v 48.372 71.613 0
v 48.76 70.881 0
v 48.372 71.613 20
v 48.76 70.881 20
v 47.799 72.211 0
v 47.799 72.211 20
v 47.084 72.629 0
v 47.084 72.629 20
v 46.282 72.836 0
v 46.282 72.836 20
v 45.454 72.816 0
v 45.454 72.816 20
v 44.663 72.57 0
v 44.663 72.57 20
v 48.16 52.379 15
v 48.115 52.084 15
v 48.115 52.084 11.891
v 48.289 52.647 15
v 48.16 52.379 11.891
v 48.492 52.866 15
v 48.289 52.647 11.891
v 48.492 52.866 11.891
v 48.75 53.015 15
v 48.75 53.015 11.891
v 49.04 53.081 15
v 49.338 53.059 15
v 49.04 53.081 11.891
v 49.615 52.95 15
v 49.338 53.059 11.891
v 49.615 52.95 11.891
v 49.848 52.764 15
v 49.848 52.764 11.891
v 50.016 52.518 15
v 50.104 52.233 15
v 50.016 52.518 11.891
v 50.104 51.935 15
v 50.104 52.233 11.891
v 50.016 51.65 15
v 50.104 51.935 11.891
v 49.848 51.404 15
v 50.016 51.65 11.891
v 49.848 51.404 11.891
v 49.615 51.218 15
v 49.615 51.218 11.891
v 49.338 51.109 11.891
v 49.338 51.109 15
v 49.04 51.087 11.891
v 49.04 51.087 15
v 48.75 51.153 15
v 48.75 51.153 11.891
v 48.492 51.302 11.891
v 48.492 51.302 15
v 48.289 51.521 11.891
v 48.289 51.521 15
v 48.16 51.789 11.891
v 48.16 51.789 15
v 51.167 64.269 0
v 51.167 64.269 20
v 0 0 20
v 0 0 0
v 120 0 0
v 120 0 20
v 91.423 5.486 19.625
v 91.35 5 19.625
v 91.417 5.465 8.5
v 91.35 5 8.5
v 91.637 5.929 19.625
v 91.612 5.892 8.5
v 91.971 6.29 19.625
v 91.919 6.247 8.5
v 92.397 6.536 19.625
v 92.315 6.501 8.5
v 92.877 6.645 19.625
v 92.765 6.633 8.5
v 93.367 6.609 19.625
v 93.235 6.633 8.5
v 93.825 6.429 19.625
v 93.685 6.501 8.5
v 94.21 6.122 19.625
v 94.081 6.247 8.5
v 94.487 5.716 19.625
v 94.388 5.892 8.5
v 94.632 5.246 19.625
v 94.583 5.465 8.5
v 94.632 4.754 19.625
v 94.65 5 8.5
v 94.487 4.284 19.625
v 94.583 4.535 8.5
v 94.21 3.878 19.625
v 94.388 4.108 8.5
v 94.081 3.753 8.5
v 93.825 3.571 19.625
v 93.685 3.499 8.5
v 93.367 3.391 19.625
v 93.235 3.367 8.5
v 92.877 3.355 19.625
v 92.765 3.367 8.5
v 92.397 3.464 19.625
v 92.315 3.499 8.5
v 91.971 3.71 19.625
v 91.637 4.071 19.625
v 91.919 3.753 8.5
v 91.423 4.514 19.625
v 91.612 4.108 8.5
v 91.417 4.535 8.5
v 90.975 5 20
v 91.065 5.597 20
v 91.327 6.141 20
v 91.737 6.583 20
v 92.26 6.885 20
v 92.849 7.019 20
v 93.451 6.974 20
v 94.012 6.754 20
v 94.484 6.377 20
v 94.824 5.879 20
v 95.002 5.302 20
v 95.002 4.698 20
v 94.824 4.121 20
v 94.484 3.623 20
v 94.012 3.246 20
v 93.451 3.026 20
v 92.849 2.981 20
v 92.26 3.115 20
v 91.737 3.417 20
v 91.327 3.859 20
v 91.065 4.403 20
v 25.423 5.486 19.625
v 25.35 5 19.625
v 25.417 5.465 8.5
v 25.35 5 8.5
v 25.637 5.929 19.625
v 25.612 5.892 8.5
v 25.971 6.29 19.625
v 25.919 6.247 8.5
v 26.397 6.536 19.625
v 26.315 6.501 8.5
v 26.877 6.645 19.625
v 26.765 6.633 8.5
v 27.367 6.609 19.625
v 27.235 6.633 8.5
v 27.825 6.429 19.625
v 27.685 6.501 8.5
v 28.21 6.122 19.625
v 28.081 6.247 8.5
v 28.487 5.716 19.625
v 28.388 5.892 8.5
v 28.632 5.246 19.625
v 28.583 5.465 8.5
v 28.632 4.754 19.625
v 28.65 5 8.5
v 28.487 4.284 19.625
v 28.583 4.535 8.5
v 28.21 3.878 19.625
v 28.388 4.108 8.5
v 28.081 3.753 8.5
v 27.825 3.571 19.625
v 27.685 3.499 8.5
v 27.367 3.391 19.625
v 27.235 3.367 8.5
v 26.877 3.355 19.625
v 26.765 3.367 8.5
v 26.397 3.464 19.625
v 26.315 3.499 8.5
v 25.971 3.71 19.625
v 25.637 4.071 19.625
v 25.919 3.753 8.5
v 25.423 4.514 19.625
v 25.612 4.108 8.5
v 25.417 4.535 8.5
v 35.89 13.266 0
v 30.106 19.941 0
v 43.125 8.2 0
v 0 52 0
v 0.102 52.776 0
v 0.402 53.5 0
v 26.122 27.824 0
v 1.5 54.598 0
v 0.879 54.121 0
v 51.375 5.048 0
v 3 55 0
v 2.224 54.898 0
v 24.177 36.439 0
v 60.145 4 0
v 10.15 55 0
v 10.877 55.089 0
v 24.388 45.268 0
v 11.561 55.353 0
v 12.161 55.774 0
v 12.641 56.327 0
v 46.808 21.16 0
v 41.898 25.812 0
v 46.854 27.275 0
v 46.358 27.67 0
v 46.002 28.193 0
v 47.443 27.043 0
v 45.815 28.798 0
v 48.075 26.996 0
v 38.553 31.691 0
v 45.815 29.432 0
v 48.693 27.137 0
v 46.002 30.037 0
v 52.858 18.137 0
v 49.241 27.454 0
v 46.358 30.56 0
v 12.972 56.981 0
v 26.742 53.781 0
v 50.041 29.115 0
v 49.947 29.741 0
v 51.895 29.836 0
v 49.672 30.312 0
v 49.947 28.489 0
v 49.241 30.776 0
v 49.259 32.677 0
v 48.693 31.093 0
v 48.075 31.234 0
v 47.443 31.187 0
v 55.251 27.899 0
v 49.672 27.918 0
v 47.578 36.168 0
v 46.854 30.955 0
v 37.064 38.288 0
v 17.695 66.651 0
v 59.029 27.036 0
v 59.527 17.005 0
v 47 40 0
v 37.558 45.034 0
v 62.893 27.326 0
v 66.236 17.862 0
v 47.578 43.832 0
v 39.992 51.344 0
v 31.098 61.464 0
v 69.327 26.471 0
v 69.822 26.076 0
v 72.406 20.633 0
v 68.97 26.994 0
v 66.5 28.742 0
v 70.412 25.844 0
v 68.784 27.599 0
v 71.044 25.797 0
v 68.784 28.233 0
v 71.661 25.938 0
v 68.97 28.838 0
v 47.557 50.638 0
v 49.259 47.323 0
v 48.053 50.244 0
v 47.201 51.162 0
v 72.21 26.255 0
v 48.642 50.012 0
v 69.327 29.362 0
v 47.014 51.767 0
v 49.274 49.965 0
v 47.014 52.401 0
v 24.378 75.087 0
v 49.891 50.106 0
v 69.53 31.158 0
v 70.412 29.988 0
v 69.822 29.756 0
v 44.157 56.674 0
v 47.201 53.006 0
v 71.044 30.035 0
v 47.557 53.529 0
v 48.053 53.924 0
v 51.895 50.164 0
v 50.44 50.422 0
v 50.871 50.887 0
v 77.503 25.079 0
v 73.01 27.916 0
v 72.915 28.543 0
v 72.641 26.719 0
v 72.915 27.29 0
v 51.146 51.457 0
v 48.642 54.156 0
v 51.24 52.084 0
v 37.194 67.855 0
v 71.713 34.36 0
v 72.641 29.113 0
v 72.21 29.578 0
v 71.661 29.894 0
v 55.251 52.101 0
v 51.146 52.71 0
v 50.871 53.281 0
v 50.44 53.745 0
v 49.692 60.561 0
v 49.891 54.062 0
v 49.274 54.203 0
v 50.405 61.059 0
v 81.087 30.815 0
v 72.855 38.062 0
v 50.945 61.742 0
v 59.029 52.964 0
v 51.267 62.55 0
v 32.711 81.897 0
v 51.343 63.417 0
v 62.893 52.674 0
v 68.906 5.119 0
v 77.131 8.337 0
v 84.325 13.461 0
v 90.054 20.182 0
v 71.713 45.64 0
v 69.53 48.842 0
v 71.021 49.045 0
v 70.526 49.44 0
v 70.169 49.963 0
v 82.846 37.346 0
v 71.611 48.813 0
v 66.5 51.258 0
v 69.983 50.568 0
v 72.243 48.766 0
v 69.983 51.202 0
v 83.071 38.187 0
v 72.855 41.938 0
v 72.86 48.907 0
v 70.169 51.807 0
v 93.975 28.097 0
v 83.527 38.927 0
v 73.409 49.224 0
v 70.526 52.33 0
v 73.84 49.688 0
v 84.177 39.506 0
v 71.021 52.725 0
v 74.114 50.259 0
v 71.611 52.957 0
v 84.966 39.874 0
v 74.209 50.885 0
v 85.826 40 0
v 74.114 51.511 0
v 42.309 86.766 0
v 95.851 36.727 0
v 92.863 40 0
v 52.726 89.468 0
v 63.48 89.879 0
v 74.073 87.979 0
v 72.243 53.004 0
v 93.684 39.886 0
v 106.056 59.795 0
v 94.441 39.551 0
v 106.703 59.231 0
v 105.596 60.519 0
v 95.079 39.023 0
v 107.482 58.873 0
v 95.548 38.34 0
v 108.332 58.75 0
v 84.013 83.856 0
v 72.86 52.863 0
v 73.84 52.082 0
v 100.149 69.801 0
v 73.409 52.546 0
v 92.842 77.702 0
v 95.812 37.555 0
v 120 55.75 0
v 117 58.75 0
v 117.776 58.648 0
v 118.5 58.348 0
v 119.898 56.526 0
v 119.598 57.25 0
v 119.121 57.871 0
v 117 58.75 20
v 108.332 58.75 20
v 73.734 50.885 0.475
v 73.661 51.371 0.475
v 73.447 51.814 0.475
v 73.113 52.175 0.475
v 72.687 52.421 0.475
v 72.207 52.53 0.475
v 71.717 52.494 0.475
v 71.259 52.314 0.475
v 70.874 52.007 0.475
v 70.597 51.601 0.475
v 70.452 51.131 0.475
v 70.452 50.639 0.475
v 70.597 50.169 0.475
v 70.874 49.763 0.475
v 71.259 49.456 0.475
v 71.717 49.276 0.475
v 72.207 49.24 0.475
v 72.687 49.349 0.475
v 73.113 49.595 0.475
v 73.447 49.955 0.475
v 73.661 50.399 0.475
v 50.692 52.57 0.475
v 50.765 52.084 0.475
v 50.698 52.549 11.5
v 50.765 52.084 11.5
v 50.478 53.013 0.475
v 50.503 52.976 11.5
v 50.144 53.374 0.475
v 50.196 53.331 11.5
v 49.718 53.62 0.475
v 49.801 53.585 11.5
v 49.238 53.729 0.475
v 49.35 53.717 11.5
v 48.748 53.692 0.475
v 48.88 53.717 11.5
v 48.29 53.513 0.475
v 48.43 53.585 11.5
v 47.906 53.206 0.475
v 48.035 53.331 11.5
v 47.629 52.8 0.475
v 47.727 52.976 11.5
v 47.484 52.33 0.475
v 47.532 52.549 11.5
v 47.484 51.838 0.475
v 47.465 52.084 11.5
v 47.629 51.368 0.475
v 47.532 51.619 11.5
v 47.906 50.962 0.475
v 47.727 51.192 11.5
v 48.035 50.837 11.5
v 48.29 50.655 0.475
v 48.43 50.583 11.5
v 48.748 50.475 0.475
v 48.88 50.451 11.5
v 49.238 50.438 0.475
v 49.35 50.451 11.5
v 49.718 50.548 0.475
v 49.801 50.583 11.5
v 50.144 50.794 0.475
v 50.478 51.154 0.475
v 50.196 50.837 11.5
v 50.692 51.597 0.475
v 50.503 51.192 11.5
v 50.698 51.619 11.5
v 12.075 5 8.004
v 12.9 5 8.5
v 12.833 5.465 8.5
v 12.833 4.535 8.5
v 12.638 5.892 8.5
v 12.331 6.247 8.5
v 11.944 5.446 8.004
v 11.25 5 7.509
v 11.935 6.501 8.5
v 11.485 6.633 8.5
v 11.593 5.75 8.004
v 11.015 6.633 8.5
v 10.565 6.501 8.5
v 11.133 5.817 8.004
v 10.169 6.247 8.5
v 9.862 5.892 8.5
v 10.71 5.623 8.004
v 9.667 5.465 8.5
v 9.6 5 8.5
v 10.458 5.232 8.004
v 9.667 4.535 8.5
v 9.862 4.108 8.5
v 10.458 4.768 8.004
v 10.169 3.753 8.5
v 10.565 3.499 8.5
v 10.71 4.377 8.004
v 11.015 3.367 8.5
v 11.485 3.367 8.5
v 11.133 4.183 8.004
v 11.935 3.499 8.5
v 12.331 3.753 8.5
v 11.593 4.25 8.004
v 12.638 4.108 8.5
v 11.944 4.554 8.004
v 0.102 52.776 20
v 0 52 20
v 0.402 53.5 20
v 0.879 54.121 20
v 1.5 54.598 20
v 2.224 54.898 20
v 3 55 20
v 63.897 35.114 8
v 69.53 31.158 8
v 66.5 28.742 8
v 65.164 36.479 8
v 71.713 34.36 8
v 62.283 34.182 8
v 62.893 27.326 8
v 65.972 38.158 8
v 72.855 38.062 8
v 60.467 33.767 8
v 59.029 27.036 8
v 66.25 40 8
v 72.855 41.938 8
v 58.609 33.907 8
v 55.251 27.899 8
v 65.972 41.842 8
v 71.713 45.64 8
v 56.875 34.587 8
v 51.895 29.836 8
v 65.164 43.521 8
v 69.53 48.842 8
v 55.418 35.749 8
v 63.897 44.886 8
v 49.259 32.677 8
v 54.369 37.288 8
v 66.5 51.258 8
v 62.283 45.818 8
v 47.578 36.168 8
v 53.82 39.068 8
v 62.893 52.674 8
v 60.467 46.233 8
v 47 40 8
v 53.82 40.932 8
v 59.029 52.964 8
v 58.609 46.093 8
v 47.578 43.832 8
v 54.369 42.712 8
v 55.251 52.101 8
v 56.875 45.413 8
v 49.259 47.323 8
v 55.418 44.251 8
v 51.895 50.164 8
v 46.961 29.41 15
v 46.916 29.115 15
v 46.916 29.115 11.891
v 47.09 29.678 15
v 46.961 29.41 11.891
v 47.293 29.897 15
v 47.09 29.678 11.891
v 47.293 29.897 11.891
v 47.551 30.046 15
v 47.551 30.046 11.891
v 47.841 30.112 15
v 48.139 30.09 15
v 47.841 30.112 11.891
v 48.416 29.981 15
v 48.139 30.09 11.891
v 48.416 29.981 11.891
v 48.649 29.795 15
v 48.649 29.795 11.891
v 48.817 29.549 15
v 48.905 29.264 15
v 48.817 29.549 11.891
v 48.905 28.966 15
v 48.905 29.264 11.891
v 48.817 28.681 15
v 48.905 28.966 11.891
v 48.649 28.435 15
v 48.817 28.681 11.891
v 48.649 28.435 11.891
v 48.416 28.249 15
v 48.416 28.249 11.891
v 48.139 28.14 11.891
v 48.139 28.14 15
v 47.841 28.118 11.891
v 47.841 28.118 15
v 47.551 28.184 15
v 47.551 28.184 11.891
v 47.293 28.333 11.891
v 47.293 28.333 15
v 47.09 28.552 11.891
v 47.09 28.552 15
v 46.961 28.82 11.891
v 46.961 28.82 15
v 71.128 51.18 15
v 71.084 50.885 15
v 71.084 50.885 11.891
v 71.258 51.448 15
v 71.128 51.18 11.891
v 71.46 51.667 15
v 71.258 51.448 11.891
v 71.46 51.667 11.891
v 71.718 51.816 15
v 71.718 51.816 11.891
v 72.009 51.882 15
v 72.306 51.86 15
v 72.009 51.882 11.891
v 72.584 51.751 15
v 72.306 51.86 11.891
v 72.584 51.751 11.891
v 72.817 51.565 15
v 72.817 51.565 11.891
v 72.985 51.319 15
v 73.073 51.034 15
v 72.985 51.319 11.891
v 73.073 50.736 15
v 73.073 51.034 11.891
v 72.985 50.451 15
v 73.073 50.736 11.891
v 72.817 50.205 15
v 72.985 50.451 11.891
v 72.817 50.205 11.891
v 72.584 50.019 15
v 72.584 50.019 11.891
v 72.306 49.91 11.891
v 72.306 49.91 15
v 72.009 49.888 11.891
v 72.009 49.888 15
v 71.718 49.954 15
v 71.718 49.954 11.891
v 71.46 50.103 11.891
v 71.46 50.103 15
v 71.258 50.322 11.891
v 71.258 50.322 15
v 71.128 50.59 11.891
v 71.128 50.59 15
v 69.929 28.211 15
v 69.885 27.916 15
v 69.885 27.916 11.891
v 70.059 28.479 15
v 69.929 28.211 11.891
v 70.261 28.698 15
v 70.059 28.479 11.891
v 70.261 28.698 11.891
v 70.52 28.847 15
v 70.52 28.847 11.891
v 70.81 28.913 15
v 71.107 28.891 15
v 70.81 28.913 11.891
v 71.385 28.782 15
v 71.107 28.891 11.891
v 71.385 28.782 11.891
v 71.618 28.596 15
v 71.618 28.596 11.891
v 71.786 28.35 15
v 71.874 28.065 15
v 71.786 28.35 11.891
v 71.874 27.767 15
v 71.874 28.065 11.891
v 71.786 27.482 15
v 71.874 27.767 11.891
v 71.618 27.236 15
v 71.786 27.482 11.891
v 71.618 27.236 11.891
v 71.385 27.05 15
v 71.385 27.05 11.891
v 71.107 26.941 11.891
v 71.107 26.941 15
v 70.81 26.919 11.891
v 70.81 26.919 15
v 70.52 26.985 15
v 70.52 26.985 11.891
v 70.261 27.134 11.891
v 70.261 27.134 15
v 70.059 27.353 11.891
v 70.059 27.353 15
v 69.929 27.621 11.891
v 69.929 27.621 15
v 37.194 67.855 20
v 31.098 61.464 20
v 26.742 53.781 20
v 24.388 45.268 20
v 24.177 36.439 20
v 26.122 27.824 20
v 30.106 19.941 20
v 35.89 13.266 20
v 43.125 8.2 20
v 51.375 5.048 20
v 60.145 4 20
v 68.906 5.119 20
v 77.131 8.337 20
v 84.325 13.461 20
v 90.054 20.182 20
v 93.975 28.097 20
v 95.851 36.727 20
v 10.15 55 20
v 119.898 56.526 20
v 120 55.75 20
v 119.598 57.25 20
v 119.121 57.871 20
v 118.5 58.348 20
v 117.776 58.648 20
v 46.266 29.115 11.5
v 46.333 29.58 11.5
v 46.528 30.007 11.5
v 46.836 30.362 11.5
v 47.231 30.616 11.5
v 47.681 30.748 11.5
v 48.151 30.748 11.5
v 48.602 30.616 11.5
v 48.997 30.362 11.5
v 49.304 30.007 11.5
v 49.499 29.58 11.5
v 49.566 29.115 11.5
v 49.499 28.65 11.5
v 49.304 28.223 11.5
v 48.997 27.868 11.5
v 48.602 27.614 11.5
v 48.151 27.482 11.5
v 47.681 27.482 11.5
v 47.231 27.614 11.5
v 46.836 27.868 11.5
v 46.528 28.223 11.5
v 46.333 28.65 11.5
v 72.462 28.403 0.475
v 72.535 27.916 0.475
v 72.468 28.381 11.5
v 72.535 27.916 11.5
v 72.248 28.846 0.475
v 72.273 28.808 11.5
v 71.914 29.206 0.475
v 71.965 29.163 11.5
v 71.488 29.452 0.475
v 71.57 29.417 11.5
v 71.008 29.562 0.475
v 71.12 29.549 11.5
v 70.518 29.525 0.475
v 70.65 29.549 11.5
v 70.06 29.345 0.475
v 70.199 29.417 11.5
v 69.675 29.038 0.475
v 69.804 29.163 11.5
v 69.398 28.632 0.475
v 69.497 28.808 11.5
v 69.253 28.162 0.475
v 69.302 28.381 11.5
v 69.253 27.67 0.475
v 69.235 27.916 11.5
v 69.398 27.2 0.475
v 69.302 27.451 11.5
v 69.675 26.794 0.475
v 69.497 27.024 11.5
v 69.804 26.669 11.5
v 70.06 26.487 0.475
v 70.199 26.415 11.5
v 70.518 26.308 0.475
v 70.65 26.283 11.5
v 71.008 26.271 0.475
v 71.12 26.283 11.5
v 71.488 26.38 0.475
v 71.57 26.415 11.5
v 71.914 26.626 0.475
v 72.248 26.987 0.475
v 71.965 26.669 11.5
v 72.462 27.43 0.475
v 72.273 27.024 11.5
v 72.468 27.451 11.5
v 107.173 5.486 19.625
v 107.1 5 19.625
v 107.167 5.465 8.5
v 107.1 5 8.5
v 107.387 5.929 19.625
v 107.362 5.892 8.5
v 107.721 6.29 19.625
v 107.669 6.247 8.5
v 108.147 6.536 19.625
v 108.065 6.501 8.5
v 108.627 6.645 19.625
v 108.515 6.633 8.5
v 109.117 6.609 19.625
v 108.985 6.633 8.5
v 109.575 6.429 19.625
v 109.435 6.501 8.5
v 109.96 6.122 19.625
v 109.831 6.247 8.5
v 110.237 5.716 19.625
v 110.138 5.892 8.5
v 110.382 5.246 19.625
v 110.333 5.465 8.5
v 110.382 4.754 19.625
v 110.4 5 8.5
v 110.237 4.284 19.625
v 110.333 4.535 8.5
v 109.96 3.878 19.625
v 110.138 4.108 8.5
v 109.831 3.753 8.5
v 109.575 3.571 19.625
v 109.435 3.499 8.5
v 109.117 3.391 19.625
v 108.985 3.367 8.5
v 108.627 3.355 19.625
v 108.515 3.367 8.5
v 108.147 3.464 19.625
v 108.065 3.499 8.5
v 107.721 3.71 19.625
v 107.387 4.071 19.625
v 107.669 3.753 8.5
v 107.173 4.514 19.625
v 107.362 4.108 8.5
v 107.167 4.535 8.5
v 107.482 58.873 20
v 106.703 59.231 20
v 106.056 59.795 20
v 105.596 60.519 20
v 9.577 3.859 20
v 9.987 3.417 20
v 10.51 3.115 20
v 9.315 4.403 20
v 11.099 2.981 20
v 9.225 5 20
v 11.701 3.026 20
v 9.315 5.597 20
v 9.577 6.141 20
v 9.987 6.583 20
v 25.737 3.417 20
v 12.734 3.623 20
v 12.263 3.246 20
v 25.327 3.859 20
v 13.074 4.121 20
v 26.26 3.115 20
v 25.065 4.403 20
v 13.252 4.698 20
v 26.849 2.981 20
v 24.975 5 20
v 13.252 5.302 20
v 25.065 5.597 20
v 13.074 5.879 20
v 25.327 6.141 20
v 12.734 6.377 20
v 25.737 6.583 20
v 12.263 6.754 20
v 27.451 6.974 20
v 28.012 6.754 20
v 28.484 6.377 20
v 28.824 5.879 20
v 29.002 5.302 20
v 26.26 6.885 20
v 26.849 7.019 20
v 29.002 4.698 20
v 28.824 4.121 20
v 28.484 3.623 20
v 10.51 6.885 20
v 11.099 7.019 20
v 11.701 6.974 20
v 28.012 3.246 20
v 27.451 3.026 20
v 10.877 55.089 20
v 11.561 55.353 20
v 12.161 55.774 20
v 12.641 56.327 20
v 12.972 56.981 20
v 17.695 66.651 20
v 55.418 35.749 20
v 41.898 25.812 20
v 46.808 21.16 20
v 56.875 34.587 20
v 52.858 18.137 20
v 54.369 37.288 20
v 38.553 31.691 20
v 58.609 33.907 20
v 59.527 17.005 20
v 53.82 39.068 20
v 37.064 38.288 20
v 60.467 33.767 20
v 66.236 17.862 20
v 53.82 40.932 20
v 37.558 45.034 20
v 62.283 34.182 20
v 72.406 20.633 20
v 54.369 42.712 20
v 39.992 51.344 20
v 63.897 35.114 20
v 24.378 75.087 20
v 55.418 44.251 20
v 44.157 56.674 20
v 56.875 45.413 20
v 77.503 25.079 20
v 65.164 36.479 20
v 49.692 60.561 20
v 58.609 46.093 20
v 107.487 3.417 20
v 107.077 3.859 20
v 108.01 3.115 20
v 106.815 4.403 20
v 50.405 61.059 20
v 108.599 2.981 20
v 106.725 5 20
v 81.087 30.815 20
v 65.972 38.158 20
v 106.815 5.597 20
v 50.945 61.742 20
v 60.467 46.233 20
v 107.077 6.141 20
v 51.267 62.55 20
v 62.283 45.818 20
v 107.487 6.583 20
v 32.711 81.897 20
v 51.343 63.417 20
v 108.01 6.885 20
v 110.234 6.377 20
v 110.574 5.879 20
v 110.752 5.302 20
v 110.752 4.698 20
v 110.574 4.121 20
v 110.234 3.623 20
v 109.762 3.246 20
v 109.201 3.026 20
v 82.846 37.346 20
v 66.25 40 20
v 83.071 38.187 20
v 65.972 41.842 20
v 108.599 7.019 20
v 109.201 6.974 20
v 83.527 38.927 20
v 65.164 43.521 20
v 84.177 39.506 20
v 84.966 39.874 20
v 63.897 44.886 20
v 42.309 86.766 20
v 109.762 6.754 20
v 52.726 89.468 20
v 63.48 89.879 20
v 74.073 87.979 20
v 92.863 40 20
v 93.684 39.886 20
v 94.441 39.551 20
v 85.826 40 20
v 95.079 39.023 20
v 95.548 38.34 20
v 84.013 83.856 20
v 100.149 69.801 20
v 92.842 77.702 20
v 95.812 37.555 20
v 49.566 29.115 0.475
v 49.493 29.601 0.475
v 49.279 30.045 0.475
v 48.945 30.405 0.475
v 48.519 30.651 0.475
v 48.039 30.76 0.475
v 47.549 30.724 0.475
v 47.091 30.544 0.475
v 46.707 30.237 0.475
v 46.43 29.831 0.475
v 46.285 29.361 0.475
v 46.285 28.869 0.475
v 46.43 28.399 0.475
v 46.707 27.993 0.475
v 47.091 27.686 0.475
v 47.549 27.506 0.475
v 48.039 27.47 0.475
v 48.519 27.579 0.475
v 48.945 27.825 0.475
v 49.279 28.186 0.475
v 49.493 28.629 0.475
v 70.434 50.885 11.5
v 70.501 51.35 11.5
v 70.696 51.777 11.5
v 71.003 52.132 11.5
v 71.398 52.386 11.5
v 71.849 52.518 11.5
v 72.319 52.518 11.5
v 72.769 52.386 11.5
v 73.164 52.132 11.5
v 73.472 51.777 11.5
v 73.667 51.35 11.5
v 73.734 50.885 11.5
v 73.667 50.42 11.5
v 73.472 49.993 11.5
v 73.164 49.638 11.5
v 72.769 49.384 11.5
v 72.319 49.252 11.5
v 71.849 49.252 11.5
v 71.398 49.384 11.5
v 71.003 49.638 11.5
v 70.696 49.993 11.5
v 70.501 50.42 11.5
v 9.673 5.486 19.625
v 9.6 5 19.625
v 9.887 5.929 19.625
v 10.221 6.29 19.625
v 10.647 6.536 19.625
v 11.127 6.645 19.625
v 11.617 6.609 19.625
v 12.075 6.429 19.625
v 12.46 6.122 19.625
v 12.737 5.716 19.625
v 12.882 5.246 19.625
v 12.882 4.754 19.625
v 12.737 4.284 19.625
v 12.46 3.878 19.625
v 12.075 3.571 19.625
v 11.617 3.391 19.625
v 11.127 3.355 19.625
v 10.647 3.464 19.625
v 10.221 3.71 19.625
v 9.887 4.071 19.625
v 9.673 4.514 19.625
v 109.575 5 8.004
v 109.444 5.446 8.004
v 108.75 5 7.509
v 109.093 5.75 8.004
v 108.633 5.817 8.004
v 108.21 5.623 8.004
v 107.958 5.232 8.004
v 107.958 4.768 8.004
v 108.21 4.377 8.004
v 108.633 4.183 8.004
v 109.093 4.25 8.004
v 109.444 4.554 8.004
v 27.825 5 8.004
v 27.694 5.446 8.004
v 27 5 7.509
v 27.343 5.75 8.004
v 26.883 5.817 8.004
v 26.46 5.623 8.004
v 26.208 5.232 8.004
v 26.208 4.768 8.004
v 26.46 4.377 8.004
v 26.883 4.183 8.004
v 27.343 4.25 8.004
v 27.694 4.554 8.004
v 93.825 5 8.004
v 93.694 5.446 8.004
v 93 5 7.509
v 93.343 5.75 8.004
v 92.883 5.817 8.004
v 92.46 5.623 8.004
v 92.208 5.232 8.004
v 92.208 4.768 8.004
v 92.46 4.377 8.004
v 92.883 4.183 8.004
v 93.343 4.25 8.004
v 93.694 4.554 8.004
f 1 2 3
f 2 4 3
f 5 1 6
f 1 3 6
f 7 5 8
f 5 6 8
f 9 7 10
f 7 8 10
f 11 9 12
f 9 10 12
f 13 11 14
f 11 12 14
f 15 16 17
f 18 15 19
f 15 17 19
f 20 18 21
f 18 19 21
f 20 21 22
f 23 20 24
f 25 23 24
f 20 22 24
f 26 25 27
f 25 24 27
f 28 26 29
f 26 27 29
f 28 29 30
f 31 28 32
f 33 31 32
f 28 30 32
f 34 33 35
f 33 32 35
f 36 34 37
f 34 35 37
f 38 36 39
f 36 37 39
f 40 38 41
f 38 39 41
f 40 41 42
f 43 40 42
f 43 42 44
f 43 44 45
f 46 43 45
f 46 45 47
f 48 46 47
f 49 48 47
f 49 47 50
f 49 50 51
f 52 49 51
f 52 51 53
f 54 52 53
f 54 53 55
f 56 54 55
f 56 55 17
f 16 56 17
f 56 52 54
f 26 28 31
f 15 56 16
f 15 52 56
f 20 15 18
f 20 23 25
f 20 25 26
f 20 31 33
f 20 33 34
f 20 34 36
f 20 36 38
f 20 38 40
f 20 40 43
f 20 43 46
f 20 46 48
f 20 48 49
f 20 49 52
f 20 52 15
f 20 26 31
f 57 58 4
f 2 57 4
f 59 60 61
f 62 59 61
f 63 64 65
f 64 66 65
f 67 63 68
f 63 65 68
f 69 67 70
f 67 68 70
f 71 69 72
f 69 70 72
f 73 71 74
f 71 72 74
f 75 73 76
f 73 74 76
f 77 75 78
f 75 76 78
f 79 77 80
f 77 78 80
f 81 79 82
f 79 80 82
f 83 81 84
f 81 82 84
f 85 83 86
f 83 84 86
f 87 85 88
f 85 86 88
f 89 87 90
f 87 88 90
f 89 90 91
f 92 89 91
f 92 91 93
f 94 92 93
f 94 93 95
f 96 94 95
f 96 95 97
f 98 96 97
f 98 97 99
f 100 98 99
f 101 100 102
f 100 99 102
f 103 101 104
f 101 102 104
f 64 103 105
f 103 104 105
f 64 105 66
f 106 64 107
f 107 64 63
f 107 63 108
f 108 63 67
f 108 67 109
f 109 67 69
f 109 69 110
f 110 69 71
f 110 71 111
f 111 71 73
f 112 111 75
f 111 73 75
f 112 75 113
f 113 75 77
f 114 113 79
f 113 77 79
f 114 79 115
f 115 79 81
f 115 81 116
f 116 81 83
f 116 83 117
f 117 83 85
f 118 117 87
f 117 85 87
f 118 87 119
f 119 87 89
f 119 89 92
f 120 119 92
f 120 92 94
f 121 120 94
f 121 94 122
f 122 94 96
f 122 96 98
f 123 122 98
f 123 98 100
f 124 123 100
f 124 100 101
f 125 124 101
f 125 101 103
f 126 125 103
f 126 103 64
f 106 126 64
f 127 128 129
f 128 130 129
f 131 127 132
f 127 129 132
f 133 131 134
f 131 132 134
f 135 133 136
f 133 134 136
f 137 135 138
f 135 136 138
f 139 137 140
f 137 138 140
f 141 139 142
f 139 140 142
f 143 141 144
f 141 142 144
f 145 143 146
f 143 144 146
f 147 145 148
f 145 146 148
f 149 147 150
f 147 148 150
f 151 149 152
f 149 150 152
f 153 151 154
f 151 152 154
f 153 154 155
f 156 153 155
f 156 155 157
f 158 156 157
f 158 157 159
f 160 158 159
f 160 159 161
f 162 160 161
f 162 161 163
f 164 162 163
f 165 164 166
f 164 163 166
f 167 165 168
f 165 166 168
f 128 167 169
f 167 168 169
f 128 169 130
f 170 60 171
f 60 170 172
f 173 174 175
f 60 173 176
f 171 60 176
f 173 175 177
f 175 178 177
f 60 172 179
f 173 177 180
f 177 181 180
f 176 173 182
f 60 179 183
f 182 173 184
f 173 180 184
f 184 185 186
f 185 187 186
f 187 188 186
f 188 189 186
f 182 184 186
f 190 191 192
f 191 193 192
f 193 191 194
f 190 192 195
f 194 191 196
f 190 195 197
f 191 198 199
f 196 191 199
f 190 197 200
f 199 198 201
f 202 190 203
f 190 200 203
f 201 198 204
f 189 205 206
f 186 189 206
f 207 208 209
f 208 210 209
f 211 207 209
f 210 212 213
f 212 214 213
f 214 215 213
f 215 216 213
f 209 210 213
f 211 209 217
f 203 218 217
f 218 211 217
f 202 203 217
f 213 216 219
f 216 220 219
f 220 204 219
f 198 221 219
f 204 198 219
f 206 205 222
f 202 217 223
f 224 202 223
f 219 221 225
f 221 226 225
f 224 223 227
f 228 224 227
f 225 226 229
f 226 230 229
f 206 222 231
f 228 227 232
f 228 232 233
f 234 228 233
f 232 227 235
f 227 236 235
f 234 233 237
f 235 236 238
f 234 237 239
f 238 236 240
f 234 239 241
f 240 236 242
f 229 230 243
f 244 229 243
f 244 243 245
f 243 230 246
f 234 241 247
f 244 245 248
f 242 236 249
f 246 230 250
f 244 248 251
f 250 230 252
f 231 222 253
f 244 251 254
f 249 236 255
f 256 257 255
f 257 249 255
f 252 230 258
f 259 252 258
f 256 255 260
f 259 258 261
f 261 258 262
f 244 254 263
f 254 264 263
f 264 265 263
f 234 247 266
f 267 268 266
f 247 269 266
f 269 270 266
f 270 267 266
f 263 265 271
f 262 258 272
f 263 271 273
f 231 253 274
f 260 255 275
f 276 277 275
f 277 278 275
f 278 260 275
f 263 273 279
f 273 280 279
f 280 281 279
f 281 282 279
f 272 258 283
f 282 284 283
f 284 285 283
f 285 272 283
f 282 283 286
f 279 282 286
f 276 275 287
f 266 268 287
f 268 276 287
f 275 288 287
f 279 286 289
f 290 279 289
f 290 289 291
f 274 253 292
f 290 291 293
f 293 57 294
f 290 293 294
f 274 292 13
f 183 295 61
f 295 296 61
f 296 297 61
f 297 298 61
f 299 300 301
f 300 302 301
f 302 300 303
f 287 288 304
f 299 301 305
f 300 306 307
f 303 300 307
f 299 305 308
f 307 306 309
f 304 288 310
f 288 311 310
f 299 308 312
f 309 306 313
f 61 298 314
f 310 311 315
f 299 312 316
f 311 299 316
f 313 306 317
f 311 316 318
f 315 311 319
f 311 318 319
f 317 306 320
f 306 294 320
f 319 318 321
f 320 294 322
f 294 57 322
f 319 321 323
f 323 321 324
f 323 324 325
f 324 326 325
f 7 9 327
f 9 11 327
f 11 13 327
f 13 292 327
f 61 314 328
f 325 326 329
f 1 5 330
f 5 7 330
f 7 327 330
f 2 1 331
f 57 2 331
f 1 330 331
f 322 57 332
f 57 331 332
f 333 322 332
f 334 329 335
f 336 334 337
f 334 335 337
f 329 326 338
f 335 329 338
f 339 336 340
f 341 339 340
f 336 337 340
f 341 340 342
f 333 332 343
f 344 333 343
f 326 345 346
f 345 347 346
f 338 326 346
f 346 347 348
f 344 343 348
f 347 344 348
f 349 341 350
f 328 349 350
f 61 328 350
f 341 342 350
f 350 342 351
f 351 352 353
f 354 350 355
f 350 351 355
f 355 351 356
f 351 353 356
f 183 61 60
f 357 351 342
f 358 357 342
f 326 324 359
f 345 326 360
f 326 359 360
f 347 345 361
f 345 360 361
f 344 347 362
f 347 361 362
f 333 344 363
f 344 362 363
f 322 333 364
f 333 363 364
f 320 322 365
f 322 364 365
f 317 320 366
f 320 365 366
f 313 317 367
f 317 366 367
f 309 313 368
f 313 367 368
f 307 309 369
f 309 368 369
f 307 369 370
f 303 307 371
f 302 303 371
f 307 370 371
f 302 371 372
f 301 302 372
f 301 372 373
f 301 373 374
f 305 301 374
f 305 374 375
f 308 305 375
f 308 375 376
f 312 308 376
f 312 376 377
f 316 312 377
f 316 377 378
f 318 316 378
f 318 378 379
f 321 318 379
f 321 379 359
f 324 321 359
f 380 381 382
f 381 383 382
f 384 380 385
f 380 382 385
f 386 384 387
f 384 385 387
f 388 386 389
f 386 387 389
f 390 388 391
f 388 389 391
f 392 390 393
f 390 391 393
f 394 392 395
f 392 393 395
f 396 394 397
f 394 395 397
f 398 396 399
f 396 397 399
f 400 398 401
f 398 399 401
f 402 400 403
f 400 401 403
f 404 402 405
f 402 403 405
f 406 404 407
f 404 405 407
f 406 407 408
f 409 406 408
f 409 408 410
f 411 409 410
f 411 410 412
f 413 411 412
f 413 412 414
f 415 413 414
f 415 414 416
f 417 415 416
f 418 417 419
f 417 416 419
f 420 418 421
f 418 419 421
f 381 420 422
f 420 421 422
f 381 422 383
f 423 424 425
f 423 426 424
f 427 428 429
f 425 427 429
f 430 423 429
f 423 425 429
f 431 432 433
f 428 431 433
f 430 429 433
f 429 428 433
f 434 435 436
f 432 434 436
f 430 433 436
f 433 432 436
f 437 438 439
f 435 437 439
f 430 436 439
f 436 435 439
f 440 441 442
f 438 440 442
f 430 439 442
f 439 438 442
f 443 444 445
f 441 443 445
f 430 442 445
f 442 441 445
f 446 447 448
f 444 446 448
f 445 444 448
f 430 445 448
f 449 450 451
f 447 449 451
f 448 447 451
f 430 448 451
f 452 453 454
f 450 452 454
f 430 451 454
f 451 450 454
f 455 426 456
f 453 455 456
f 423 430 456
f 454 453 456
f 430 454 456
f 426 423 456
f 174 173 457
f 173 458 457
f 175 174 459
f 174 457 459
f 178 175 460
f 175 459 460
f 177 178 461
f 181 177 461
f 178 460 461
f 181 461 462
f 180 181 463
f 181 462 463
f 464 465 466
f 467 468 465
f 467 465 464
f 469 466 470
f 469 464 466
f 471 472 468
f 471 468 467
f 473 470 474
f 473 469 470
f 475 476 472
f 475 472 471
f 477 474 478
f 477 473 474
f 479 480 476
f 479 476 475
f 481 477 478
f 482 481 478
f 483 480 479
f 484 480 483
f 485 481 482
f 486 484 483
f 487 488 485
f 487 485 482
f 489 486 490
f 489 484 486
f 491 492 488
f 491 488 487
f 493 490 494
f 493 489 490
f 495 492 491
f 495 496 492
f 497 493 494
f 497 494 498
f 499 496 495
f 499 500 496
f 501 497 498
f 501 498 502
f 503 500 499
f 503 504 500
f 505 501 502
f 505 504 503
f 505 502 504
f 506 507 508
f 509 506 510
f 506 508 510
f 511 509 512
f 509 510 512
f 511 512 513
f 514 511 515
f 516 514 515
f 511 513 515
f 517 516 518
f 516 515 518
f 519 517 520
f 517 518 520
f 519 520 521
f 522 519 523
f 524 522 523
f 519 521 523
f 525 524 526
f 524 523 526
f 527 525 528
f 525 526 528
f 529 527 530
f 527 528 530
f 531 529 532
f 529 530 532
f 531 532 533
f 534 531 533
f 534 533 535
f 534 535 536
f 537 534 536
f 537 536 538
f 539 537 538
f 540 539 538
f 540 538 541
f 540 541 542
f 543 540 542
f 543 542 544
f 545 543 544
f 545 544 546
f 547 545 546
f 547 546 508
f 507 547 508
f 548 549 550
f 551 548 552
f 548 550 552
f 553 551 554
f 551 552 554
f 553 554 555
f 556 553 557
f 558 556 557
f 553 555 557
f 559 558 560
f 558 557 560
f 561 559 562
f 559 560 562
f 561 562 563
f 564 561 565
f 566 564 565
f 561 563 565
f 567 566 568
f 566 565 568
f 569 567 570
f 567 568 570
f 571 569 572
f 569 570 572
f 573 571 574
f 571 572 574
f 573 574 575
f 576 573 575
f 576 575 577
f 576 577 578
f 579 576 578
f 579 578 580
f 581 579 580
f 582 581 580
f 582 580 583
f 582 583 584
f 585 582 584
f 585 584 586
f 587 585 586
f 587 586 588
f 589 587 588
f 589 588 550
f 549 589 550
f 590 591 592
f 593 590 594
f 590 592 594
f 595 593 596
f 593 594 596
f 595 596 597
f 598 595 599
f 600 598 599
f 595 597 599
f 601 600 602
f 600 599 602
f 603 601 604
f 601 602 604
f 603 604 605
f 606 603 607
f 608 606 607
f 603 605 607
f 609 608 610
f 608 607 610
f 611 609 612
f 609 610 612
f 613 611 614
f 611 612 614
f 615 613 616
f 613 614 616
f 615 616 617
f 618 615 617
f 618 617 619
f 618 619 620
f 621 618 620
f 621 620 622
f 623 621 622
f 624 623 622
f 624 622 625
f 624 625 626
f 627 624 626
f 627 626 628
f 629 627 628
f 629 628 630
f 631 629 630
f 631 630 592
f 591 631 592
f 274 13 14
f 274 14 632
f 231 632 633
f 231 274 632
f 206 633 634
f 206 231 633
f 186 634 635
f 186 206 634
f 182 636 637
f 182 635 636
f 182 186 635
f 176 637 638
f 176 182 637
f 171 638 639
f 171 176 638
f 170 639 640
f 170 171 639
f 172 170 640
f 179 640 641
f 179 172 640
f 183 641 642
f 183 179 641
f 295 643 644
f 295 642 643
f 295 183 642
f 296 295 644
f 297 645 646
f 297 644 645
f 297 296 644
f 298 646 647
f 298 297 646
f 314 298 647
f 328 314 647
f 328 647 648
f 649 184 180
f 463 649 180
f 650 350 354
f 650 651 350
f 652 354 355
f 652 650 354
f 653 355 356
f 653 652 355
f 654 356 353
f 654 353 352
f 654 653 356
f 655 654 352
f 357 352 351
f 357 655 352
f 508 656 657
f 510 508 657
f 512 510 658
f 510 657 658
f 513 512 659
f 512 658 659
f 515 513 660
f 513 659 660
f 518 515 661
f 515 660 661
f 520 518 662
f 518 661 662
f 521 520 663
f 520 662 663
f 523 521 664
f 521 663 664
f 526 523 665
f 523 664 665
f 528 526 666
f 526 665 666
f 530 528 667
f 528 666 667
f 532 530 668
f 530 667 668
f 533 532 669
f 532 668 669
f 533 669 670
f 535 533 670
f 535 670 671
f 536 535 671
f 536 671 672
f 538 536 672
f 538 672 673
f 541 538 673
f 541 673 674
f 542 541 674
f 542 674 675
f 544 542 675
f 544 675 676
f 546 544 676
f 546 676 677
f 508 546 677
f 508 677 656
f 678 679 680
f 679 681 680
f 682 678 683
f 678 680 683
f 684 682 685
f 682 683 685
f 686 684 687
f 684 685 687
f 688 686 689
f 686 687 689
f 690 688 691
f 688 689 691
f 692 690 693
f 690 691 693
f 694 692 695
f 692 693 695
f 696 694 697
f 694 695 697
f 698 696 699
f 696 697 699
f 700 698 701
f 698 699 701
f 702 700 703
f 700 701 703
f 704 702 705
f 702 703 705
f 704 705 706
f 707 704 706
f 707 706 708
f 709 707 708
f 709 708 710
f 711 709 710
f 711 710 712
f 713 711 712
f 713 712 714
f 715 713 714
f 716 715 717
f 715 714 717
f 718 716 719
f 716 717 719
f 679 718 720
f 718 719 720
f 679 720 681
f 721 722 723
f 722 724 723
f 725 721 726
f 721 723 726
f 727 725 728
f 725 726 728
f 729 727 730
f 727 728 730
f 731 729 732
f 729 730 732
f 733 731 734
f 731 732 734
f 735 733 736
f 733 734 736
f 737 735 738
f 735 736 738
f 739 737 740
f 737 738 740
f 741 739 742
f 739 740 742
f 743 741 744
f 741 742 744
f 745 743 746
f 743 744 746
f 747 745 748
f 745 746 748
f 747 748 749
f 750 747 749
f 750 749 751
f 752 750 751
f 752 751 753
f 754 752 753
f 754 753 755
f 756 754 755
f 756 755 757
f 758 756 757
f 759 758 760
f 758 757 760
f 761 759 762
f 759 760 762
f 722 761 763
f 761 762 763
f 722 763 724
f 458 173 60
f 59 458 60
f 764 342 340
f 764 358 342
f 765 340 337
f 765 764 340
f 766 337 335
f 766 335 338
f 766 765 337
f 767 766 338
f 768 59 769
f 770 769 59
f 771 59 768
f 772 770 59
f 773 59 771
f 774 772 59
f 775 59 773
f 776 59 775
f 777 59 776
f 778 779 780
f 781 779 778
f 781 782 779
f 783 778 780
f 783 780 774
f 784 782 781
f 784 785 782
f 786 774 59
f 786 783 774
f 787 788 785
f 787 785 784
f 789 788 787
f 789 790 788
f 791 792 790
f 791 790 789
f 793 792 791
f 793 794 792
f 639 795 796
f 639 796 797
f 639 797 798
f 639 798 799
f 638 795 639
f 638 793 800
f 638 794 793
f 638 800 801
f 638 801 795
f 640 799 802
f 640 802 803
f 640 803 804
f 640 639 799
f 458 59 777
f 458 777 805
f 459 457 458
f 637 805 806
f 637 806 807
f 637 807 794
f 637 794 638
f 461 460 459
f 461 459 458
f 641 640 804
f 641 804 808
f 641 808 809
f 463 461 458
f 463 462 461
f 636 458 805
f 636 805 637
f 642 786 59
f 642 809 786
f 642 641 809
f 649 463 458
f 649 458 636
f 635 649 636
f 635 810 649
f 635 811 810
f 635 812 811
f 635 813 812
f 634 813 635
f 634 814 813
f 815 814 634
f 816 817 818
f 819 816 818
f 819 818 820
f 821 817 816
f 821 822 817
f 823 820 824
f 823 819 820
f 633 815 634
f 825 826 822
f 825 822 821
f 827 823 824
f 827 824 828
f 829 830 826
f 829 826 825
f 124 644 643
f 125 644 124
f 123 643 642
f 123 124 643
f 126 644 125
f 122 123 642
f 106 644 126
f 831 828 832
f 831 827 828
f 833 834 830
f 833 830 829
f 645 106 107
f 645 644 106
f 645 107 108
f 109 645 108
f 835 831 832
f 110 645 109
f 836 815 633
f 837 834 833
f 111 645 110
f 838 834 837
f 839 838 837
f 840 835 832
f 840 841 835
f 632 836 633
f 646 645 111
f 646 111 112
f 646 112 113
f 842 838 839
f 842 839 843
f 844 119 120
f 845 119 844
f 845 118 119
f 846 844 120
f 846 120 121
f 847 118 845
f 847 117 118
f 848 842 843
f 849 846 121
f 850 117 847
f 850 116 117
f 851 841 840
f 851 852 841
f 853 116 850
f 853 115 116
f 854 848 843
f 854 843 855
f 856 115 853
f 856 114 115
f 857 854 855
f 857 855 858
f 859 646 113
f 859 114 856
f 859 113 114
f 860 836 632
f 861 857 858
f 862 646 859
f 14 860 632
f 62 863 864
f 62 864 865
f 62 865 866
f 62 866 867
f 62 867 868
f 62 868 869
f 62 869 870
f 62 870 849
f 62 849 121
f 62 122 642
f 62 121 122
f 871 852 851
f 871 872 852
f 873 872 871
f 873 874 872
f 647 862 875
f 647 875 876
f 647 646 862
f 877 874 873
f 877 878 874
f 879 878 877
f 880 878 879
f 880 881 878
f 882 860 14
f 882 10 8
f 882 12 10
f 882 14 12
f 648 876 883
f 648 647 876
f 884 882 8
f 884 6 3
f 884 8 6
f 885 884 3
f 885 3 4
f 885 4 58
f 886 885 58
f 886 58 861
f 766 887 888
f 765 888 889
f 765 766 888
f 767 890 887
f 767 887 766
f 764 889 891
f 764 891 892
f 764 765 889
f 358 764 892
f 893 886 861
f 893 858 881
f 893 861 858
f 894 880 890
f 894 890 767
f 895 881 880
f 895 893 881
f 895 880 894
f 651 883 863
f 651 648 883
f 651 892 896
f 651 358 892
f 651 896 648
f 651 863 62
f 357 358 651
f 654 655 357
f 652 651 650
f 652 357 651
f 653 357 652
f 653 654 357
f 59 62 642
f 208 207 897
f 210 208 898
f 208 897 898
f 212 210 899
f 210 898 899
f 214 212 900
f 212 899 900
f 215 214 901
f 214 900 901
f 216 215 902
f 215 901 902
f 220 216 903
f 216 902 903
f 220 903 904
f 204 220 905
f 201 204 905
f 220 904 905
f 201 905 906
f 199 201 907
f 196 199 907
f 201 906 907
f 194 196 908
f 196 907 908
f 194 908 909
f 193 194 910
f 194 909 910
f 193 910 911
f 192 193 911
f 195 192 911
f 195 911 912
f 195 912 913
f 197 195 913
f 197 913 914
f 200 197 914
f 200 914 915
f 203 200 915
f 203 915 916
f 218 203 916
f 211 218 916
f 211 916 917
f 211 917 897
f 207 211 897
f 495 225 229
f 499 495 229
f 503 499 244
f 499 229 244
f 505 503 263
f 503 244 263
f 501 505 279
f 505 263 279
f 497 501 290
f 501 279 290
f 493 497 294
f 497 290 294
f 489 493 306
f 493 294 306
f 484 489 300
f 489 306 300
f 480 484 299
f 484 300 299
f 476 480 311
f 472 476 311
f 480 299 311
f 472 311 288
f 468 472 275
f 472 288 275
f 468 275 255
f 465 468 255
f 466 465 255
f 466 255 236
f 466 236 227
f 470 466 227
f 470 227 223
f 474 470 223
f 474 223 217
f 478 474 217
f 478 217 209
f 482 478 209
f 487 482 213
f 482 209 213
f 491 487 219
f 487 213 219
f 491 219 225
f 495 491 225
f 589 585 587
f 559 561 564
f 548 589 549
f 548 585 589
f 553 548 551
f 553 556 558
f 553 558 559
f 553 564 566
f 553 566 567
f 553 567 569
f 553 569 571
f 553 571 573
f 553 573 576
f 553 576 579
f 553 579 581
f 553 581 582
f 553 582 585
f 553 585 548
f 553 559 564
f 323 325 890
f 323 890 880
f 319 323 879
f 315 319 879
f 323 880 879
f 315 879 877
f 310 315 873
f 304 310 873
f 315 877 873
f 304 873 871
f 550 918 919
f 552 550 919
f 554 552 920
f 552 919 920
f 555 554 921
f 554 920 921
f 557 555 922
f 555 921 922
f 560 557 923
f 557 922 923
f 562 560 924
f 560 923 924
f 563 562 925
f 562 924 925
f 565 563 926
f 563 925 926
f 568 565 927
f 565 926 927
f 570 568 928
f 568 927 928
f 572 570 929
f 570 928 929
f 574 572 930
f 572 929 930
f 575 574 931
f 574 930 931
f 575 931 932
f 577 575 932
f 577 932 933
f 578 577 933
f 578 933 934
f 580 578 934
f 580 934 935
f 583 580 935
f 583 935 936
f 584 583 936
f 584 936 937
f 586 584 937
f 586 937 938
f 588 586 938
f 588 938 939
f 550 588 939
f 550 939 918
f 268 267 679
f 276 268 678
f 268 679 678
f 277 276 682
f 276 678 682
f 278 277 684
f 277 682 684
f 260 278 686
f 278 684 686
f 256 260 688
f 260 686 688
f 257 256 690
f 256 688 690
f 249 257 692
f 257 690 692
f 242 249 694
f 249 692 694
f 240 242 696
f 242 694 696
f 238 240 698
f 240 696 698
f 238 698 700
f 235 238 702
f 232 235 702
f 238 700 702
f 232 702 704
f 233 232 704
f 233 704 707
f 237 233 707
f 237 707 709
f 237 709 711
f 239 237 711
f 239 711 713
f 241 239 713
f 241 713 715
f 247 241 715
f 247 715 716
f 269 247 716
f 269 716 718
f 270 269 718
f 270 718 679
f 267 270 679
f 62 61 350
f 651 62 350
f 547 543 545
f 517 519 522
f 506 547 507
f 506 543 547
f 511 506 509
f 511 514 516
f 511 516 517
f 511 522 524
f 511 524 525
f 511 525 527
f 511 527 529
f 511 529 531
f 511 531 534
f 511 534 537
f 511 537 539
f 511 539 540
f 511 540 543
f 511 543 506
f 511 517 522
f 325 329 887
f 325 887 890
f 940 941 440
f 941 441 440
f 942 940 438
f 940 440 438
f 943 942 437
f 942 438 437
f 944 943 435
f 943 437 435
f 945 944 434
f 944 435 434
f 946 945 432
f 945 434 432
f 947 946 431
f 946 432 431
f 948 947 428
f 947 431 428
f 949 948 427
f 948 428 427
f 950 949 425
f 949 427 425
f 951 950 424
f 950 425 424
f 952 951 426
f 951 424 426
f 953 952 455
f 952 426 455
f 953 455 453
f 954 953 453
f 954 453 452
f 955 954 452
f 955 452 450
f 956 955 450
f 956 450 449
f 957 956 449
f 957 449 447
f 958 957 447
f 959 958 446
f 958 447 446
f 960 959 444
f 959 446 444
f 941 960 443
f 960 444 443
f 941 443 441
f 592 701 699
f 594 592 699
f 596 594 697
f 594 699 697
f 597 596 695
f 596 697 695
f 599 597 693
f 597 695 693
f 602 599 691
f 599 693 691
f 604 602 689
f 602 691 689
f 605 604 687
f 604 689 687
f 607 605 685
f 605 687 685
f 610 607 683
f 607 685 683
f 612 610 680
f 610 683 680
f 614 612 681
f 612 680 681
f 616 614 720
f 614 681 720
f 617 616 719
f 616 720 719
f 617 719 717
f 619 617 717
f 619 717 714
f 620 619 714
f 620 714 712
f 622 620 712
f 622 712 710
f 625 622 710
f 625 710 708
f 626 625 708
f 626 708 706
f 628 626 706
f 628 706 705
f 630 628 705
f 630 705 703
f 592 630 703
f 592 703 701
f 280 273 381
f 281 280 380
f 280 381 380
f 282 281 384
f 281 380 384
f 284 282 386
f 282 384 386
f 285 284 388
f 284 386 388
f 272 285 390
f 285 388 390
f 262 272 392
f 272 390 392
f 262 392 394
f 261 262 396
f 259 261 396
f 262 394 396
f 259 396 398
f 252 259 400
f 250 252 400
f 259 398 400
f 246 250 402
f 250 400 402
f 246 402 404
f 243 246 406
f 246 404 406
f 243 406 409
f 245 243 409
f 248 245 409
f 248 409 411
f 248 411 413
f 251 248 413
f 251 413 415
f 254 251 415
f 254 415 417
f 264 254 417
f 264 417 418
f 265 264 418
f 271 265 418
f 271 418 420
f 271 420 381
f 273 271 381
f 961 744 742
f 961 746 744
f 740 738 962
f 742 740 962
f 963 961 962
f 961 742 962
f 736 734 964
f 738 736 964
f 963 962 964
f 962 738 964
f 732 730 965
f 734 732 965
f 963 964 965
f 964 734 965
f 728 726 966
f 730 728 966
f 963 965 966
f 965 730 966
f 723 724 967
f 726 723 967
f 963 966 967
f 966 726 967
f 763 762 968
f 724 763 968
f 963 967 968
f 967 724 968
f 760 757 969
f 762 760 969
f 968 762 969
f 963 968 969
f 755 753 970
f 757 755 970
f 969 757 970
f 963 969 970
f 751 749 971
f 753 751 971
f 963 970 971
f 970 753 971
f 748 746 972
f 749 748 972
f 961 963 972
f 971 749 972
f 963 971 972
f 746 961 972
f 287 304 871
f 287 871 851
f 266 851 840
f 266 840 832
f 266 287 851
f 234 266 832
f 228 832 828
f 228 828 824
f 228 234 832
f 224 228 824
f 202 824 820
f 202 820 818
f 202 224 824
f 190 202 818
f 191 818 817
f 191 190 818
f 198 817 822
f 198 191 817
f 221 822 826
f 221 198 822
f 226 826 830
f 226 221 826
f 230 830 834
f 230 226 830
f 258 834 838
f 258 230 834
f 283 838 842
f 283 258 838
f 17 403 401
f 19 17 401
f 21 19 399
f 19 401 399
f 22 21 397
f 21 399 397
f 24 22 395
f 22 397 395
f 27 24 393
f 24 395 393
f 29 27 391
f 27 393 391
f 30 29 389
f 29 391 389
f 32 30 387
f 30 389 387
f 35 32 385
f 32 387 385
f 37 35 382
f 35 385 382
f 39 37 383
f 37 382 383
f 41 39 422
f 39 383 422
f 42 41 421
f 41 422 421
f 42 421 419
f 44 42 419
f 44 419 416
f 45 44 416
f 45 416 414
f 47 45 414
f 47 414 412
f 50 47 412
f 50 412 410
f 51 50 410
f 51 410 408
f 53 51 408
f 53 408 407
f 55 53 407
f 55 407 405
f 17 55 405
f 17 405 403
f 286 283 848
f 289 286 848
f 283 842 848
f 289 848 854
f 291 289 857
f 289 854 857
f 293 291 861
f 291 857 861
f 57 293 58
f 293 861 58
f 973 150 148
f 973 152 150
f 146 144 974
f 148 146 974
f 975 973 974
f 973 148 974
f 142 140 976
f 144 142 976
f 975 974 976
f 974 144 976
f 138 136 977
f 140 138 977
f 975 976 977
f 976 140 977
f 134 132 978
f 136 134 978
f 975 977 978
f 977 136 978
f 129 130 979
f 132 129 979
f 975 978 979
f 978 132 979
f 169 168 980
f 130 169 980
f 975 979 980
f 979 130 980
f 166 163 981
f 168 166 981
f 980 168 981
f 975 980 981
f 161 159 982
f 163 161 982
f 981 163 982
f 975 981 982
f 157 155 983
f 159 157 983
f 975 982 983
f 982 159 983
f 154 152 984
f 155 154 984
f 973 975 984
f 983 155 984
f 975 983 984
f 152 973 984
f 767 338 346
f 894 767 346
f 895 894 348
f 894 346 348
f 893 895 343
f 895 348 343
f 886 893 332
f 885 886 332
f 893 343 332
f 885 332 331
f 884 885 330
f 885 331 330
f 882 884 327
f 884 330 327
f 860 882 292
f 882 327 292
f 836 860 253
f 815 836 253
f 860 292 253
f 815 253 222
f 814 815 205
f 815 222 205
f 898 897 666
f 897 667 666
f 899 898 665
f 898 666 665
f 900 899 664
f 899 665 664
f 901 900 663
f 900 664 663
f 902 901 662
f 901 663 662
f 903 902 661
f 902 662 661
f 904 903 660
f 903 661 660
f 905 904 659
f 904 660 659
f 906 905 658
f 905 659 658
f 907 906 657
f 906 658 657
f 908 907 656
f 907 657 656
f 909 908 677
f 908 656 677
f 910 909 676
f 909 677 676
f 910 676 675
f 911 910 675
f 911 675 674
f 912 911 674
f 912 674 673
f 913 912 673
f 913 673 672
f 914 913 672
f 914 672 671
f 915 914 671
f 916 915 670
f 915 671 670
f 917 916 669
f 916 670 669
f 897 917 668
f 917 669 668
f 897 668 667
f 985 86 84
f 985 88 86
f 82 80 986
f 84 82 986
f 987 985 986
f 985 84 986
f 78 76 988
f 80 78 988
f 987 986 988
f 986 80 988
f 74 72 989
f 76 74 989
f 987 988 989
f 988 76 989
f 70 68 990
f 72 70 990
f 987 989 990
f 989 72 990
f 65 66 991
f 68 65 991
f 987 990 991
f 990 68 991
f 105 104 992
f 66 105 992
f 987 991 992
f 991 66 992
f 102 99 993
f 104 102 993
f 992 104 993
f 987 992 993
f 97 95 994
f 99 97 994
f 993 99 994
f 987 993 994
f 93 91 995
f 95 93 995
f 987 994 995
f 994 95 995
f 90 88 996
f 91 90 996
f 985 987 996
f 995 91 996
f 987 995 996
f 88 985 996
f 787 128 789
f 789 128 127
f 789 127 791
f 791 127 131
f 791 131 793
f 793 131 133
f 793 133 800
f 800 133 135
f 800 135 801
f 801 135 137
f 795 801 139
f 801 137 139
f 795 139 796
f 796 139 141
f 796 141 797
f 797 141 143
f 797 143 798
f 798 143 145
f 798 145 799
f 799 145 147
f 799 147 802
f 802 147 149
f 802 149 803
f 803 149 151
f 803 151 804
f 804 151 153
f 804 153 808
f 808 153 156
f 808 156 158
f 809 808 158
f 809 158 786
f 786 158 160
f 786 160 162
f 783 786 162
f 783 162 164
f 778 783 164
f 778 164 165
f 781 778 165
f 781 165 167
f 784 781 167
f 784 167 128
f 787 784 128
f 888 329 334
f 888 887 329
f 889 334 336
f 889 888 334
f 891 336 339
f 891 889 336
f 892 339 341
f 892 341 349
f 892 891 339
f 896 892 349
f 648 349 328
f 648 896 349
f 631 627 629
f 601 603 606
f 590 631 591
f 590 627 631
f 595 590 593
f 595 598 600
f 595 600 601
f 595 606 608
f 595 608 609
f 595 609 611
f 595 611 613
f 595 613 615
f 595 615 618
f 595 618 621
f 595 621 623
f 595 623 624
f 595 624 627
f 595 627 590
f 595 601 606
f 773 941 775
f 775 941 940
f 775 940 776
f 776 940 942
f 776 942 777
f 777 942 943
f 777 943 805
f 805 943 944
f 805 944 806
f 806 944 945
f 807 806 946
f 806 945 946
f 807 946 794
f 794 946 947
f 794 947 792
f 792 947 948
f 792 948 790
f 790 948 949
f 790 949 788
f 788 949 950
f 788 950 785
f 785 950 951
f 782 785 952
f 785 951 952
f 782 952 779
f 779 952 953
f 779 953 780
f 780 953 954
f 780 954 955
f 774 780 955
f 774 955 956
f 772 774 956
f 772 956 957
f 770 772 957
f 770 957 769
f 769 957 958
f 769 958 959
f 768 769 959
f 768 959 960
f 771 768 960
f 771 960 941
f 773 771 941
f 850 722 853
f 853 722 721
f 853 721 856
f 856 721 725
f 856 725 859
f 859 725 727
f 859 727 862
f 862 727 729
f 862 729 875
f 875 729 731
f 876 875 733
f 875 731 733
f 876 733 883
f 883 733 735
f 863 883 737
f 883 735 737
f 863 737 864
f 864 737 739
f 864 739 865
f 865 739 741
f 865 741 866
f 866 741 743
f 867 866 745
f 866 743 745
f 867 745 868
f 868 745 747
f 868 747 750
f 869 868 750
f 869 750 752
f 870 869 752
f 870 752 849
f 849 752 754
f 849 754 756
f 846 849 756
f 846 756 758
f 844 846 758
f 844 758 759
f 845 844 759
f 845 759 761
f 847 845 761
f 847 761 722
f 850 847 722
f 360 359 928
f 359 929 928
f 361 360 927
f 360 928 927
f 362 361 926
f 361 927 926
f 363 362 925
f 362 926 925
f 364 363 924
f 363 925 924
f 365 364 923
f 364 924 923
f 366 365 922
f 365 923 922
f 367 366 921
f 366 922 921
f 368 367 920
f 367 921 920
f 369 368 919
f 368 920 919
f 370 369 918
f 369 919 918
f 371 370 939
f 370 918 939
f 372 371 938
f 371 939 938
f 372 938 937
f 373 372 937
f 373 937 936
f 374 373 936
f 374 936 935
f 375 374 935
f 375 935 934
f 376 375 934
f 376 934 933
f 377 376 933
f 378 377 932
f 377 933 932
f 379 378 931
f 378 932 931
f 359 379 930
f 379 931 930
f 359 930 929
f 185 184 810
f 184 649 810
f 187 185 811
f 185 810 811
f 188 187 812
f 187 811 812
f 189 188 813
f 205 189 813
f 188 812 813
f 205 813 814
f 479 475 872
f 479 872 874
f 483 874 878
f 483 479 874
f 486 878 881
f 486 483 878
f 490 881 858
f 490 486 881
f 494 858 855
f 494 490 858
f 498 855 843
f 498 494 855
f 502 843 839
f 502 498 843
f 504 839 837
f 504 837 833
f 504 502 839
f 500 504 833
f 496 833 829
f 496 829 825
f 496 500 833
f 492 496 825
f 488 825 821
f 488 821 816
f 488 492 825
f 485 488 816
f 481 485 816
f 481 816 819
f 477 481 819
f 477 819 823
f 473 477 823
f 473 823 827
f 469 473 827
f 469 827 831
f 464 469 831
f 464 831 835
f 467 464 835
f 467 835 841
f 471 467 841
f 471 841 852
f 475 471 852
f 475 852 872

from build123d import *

# Parameters (mm, degrees)
SKIZZE1_R                       = 6.25
AUFSATZ_LINEAR_AUSTRAGEN1_DEPTH = 20
SKIZZE4_R                       = 13
SCHNITT_LINEAR_AUSTRAGEN2_DEPTH = 8
SCHNITT_LINEAR_AUSTRAGEN3_DEPTH = 34.3
VERRUNDUNG1_R                   = 3
VERRUNDUNG2_R                   = 3
SKIZZE7_R                       = 1
SCHNITT_LINEAR_AUSTRAGEN5_DEPTH = 15
M4_GEWINDEBOHRUNG3_D            = 3.3
M4_GEWINDEBOHRUNG3_DEPTH        = 11.5
M4_GEWINDEBOHRUNG3_CSINK_D      = 4.25
M4_GEWINDEBOHRUNG3_CSINK_ANGLE  = 90
M4_GEWINDEBOHRUNG3_TIP          = 0.991420021
M4_GEWINDEBOHRUNG4_D            = 3.3
M4_GEWINDEBOHRUNG4_DEPTH        = 11.5
M4_GEWINDEBOHRUNG4_CSINK_D      = 4.05
M4_GEWINDEBOHRUNG4_CSINK_ANGLE  = 90
M4_GEWINDEBOHRUNG4_TIP          = 0.991420021


with BuildPart() as part:
    # Skizze1 → Aufsatz-Linear austragen1 (new body)
    with BuildSketch(Plane.XY):
        with BuildLine():
            Line((0, 0), (120, 0))
            Line((120, 0), (120, 58.75))
            Line((120, 58.75), (106.351240544, 58.75))
            ThreePointArc((106.351240544, 58.75), (58.007924384, 89.960300587), (12.303039929, 55))
            Line((12.303039929, 55), (0, 55))
            Line((0, 55), (0, 0))
        make_face()
        with Locations((60, 40)):
            Circle(SKIZZE1_R, mode=Mode.SUBTRACT)
    extrude(amount=AUFSATZ_LINEAR_AUSTRAGEN1_DEPTH)

    # Skizze4 → Schnitt-Linear austragen2 (cut)
    with BuildSketch(Plane(origin=(0, 0, 0), x_dir=(-1, 0, 0), z_dir=(0, 0, -1))):
        with Locations((-60, 40)):
            Circle(SKIZZE4_R)
    extrude(amount=-SCHNITT_LINEAR_AUSTRAGEN2_DEPTH, mode=Mode.SUBTRACT)

    # Skizze5 → Schnitt-Linear austragen3 (cut)
    with BuildSketch(Plane(origin=(0, 0, 0), x_dir=(-1, 0, 0), z_dir=(0, 0, -1))):
        with BuildLine():
            Line((-96, 40), (-83, 40))
            ThreePointArc((-83, 40), (-46.807741964, 21.159502981), (-52.133536704, 61.612930278))
            Line((-52.133536704, 61.612930278), (-47.68727484, 73.828934348))
            ThreePointArc((-47.68727484, 73.828934348), (-39.351248291, 10.510526406), (-96, 40))
        make_face()
    extrude(amount=-SCHNITT_LINEAR_AUSTRAGEN3_DEPTH, mode=Mode.SUBTRACT)

    # Verrundung1
    verrundung1_edges = [part.edges().sort_by_distance(p)[0] for p in [
        (47.68727484, 73.828934348, 10),
        (96, 40, 10),
        (83, 40, 10),
        (52.133536704, 61.612930278, 10),
    ]]
    fillet(verrundung1_edges, radius=VERRUNDUNG1_R)

    # Verrundung2
    verrundung2_edges = [part.edges().sort_by_distance(p)[0] for p in [
        (0, 55, 10),
        (12.303039929, 55, 10),
        (106.351240544, 58.75, 10),
        (120, 58.75, 10),
    ]]
    fillet(verrundung2_edges, radius=VERRUNDUNG2_R)

    # Skizze7 → Schnitt-Linear austragen5 (cut)
    with BuildSketch(Plane(origin=(0, 0, 0), x_dir=(-1, 0, 0), z_dir=(0, 0, -1))):
        with Locations((-72.0838337, 50.8848961)):
            Circle(SKIZZE7_R)
        with Locations((-49.1151039, 52.0838337)):
            Circle(SKIZZE7_R)
        with Locations((-70.8848961, 27.9161663)):
            Circle(SKIZZE7_R)
        with Locations((-47.9161663, 29.1151039)):
            Circle(SKIZZE7_R)
    extrude(amount=-SCHNITT_LINEAR_AUSTRAGEN5_DEPTH, mode=Mode.SUBTRACT)

    # M4 Gewindebohrung3
    with Locations(Plane(origin=(72.0838337, 50.8848961, 0), x_dir=(-1, 0, 0), z_dir=(0, 0, -1))):
        with Locations((0, 0), (22.9687298, 1.1989376), (24.1676674, -21.7697922), (1.1989376, -22.9687298)):
            CounterSinkHole(M4_GEWINDEBOHRUNG3_D / 2, M4_GEWINDEBOHRUNG3_CSINK_D / 2, depth=M4_GEWINDEBOHRUNG3_DEPTH, counter_sink_angle=M4_GEWINDEBOHRUNG3_CSINK_ANGLE)
            with Locations((0, 0, -(M4_GEWINDEBOHRUNG3_DEPTH + M4_GEWINDEBOHRUNG3_TIP / 2))):  # 118° drill point
                Cone(0, M4_GEWINDEBOHRUNG3_D / 2, M4_GEWINDEBOHRUNG3_TIP, mode=Mode.SUBTRACT)

    # M4 Gewindebohrung4
    with Locations(Plane(origin=(11.25, 5, 20), x_dir=(1, 0, 0), z_dir=(0, 0, 1))):
        with Locations((0, 0), (15.75, 0), (81.75, 0), (97.5, 0)):
            CounterSinkHole(M4_GEWINDEBOHRUNG4_D / 2, M4_GEWINDEBOHRUNG4_CSINK_D / 2, depth=M4_GEWINDEBOHRUNG4_DEPTH, counter_sink_angle=M4_GEWINDEBOHRUNG4_CSINK_ANGLE)
            with Locations((0, 0, -(M4_GEWINDEBOHRUNG4_DEPTH + M4_GEWINDEBOHRUNG4_TIP / 2))):  # 118° drill point
                Cone(0, M4_GEWINDEBOHRUNG4_D / 2, M4_GEWINDEBOHRUNG4_TIP, mode=Mode.SUBTRACT)


solid = part.part
